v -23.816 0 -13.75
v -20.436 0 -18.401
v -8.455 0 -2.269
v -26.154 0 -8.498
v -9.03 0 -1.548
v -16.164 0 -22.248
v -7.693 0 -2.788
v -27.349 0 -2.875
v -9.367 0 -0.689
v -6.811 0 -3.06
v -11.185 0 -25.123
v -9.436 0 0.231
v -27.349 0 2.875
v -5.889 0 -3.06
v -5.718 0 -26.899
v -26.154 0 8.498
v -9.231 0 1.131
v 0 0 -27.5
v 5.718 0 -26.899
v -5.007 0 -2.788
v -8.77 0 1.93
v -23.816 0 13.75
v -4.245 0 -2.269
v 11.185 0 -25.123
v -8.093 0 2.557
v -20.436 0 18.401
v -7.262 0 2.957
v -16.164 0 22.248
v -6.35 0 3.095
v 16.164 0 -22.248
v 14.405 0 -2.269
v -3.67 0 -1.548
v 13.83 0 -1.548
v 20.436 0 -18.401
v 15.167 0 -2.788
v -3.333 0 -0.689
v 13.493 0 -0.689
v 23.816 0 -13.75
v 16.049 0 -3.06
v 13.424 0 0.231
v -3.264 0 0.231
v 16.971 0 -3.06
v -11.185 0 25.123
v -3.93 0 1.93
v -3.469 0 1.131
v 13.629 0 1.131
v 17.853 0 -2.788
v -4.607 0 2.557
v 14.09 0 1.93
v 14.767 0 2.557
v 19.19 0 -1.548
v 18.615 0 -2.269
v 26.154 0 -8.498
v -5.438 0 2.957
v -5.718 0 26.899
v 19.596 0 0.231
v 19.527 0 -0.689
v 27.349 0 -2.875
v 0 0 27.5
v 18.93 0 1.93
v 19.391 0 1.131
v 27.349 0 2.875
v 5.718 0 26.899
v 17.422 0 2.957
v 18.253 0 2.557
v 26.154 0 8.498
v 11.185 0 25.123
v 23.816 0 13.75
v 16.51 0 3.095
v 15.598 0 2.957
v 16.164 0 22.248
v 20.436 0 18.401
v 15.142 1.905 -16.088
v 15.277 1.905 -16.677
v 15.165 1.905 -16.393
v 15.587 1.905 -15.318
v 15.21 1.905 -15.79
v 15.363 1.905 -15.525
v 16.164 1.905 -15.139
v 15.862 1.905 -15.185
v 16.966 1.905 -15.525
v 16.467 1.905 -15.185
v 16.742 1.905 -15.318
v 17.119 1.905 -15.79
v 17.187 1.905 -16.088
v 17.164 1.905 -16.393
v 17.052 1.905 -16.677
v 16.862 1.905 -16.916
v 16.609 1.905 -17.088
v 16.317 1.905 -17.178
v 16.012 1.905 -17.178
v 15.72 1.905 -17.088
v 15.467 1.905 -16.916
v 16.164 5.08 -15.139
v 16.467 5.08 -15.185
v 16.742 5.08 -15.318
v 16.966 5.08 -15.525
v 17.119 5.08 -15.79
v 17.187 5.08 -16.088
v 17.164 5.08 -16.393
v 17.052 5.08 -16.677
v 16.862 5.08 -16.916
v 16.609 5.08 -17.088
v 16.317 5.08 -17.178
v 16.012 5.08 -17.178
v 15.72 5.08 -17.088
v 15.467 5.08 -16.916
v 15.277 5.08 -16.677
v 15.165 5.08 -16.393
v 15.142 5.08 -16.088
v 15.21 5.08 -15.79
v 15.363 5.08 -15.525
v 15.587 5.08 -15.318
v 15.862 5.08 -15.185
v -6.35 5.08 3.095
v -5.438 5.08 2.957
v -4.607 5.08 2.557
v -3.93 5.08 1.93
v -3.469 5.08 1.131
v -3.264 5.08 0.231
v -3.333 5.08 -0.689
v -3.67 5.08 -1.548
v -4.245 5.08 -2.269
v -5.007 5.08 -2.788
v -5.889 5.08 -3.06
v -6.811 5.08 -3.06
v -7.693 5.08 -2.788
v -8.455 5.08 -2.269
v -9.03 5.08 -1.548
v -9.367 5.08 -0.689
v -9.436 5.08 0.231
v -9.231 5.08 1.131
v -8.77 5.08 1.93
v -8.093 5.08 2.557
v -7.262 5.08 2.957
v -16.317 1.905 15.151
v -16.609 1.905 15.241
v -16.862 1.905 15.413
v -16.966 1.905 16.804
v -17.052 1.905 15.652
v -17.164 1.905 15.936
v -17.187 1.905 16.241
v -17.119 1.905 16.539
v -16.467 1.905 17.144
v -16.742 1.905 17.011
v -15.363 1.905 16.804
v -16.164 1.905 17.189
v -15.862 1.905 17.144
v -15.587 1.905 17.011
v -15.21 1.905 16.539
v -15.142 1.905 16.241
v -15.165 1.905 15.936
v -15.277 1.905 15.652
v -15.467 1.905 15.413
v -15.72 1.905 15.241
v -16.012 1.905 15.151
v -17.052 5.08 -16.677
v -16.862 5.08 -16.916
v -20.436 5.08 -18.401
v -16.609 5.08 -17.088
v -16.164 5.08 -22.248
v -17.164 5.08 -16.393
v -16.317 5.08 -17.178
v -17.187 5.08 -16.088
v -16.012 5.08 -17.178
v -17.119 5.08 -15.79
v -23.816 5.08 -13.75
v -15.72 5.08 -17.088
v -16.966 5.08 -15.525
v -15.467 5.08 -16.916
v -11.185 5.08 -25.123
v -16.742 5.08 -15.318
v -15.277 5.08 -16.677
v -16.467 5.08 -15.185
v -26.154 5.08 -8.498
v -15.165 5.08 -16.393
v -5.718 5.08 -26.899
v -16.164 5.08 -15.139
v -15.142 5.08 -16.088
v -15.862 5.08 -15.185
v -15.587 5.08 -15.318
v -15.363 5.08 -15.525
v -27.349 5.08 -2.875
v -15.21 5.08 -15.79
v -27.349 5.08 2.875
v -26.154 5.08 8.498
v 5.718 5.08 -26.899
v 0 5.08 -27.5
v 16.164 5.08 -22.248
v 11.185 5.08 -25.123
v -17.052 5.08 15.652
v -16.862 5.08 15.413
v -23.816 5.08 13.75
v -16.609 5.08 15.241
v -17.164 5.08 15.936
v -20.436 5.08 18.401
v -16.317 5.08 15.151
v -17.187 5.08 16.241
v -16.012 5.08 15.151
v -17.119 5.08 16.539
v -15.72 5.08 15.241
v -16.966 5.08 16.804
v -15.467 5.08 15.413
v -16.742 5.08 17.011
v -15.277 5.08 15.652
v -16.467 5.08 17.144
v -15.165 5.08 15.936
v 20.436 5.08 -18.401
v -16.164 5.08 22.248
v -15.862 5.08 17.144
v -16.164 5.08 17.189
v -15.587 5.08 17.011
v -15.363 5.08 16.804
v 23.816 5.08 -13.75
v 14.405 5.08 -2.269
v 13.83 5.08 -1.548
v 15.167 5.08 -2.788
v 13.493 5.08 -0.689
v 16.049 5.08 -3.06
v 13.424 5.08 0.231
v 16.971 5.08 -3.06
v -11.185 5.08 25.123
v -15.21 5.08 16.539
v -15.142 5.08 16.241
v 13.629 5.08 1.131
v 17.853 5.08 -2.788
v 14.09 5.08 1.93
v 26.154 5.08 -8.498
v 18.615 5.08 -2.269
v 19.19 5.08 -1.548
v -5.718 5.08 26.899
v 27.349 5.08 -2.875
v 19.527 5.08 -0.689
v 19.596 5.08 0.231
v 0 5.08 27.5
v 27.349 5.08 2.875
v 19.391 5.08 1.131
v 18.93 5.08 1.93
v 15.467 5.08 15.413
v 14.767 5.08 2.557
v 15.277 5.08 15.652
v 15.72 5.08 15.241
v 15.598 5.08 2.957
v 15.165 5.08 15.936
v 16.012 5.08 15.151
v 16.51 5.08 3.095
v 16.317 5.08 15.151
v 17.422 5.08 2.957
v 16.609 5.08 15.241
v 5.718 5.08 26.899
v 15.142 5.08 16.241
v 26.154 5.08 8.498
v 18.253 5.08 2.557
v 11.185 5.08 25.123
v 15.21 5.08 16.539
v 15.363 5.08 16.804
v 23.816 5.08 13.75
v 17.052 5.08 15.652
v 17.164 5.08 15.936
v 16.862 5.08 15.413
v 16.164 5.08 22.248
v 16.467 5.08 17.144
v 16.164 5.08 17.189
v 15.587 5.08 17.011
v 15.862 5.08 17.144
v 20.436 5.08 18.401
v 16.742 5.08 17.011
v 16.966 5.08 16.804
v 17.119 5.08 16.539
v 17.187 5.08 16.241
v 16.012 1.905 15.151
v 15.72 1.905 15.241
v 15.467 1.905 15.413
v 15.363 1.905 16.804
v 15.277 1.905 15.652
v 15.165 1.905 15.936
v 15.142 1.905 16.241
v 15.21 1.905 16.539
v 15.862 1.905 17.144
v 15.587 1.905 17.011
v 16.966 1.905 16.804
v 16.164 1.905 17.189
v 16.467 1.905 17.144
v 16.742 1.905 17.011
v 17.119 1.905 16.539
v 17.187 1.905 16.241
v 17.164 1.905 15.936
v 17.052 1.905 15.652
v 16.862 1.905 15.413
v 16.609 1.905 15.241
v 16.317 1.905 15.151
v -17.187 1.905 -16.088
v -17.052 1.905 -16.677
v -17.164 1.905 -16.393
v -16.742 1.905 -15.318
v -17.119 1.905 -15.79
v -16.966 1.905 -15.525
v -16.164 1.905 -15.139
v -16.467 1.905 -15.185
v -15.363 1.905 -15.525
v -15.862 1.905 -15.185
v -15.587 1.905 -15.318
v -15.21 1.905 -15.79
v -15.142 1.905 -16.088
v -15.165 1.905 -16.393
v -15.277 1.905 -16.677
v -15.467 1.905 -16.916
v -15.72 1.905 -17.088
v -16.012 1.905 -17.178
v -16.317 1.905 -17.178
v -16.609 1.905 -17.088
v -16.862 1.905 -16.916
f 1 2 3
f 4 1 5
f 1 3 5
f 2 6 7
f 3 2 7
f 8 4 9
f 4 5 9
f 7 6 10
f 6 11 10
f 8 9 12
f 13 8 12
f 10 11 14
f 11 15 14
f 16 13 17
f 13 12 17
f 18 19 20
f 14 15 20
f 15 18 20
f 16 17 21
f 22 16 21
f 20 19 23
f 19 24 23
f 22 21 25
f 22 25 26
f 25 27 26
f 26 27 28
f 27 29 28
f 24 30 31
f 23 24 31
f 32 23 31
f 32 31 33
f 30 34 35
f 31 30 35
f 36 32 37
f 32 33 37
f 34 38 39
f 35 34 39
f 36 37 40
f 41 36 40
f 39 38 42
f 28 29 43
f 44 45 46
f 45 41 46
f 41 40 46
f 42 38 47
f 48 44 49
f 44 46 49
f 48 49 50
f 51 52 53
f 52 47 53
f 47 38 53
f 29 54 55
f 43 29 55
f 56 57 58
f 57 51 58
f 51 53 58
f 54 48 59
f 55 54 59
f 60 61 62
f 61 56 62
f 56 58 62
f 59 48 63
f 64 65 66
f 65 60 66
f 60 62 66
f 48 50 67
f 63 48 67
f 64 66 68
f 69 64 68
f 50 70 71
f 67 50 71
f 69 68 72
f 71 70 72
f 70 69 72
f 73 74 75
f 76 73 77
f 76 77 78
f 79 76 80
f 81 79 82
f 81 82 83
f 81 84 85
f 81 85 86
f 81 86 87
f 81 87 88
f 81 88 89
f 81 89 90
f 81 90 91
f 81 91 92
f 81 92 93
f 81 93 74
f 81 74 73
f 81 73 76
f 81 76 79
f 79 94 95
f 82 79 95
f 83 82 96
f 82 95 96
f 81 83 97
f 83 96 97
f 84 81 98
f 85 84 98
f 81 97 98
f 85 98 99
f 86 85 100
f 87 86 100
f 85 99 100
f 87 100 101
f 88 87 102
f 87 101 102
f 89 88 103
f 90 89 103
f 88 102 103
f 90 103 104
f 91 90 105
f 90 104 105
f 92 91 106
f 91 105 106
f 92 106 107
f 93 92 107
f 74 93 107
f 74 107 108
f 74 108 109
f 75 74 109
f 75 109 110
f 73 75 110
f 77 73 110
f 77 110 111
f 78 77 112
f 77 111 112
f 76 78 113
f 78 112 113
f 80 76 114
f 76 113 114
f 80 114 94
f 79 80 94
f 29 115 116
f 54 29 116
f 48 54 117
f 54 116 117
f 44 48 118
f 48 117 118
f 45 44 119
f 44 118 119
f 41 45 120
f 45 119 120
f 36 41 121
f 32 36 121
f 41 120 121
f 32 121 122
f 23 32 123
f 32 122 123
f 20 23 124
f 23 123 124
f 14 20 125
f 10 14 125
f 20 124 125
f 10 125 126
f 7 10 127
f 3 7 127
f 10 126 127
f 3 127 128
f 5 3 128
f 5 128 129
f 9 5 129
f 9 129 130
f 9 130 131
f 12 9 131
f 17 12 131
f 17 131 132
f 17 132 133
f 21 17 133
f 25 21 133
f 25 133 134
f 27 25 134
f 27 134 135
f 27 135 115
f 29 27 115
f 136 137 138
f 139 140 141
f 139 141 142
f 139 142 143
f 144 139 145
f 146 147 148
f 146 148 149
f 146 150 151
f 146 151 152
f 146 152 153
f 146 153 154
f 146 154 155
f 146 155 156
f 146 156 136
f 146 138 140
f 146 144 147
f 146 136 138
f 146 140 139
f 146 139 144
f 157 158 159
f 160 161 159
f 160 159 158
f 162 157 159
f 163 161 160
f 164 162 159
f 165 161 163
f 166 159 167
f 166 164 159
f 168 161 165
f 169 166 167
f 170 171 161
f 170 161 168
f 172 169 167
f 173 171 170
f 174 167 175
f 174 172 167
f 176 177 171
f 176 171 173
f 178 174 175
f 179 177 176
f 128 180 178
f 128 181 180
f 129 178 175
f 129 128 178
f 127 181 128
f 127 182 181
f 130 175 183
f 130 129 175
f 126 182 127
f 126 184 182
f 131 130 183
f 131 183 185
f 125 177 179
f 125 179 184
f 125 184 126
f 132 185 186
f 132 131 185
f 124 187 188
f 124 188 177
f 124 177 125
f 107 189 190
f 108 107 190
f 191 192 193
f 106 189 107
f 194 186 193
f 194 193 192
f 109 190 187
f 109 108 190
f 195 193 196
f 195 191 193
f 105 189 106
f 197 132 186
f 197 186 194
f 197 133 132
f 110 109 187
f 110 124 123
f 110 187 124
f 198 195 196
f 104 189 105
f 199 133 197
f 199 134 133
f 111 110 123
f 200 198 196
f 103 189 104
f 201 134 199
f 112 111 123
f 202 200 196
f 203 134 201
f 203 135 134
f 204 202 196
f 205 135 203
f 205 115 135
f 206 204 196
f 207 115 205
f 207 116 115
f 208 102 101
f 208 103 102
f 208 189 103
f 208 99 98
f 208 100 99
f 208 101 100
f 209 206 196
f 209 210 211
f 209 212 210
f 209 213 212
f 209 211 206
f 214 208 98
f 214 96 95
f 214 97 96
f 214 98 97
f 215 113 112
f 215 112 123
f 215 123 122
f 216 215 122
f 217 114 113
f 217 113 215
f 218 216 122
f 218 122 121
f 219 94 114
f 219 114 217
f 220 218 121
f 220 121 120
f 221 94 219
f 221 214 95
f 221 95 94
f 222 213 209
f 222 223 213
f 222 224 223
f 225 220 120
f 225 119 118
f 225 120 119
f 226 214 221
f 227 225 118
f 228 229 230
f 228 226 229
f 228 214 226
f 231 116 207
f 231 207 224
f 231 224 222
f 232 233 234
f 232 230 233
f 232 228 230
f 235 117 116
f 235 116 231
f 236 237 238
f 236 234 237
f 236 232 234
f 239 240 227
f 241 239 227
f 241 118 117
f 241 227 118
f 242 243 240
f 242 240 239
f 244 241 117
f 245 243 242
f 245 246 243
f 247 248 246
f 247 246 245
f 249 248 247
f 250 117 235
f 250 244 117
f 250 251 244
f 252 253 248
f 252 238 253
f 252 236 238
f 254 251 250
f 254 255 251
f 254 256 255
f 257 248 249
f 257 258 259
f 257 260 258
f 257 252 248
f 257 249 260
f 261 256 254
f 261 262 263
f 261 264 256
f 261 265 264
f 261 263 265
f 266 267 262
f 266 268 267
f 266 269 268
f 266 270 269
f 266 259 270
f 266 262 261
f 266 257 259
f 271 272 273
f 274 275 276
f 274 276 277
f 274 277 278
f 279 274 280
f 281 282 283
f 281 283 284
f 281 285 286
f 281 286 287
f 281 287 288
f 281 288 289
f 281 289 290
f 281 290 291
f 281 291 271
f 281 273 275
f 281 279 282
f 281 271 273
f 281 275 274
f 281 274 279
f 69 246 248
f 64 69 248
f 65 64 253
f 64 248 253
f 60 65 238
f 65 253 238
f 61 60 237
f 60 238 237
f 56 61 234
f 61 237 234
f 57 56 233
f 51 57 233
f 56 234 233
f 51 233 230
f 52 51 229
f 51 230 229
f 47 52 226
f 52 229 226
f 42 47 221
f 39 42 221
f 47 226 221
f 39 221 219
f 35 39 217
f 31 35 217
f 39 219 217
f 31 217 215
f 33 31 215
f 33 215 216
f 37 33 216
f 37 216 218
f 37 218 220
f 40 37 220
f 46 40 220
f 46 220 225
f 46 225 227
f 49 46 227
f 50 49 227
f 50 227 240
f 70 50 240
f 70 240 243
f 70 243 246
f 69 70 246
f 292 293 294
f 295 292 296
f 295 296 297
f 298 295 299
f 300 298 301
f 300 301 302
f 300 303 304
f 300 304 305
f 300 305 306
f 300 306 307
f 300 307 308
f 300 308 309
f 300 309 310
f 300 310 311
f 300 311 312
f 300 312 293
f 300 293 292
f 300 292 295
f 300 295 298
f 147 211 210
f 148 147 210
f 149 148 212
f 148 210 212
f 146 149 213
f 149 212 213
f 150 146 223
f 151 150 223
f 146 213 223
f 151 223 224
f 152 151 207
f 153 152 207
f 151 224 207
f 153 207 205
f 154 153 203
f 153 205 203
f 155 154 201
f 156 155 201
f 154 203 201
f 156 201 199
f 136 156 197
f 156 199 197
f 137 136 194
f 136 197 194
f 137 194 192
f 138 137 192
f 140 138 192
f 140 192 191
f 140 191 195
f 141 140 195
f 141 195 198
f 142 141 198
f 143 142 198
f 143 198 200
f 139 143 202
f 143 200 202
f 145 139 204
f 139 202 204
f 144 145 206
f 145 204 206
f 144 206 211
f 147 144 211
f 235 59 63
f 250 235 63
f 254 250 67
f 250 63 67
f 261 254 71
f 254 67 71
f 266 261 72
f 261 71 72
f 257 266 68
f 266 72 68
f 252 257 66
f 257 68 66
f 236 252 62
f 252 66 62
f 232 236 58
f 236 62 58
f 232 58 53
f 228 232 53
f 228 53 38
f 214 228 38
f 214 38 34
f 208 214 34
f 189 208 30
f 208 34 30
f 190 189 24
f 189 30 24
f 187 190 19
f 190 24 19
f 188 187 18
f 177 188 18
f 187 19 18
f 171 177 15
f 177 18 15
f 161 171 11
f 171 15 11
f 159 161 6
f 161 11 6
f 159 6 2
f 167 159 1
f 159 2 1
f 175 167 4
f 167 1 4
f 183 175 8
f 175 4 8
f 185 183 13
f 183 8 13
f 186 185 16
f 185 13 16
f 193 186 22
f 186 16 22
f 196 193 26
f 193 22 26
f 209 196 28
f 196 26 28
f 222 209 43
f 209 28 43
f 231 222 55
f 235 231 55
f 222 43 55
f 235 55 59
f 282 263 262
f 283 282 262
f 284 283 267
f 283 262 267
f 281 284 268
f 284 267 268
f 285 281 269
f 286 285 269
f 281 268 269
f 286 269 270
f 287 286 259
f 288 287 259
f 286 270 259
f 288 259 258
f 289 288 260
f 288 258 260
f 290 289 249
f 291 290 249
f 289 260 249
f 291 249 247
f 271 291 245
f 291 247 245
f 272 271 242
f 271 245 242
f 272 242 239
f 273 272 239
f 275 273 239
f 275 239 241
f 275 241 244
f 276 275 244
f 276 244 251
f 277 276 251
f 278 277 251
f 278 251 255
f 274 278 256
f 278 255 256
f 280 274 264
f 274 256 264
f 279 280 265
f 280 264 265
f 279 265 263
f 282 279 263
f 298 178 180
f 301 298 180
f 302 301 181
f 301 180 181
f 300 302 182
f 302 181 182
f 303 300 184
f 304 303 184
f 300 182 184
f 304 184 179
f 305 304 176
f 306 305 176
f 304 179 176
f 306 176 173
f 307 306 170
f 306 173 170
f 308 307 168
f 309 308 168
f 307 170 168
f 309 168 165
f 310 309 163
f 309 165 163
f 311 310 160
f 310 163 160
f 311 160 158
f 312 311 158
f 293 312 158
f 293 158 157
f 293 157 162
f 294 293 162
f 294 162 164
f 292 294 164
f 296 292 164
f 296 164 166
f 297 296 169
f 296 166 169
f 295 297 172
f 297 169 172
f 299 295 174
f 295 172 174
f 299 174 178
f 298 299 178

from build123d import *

# Parameters (mm, degrees)
SKETCH1_R           = 27.5
BOSS_EXTRUDE1_DEPTH = 5.08
SKETCH2_R           = 1.025
CUT_EXTRUDE1_DEPTH  = 3.175
SKETCH3_R           = 3.095
CUT_EXTRUDE2_DEPTH  = 40.221249343


with BuildPart() as part:
    # Sketch1 → Boss-Extrude1 (new body)
    with BuildSketch(Plane(origin=(0, 0, 0), x_dir=(1, 0, 0), z_dir=(0, 1, 0))):
        with Locations(Location((0, 0, 0), (0, 0, 270))):
            Circle(SKETCH1_R)
    extrude(amount=BOSS_EXTRUDE1_DEPTH)

    # Sketch2 → Cut-Extrude1 (cut)
    with BuildSketch(Plane(origin=(0, 5.08, 0), x_dir=(1, 0, 0), z_dir=(0, 1, 0))):
        with Locations(Location((16.164461018, 16.164461018, 0), (0, 0, 270))):
            Circle(SKETCH2_R)
        with Locations(Location((16.164461018, -16.164461018, 0), (0, 0, 270))):
            Circle(SKETCH2_R)
        with Locations(Location((-16.164461018, -16.164461018, 0), (0, 0, 270))):
            Circle(SKETCH2_R)
        with Locations(Location((-16.164461018, 16.164461018, 0), (0, 0, 270))):
            Circle(SKETCH2_R)
    extrude(amount=-CUT_EXTRUDE1_DEPTH, mode=Mode.SUBTRACT)

    # Sketch3 → Cut-Extrude2 (cut, through all)
    with BuildSketch(Plane(origin=(0, 5.08, 0), x_dir=(1, 0, 0), z_dir=(0, 1, 0))):
        with Locations(Location((-6.35, 0, 0), (0, 0, 270))):
            Circle(SKETCH3_R)
        with Locations(Location((16.51, 0, 0), (0, 0, 270))):
            Circle(SKETCH3_R)
    extrude(amount=-CUT_EXTRUDE2_DEPTH, mode=Mode.SUBTRACT)


solid = part.part
